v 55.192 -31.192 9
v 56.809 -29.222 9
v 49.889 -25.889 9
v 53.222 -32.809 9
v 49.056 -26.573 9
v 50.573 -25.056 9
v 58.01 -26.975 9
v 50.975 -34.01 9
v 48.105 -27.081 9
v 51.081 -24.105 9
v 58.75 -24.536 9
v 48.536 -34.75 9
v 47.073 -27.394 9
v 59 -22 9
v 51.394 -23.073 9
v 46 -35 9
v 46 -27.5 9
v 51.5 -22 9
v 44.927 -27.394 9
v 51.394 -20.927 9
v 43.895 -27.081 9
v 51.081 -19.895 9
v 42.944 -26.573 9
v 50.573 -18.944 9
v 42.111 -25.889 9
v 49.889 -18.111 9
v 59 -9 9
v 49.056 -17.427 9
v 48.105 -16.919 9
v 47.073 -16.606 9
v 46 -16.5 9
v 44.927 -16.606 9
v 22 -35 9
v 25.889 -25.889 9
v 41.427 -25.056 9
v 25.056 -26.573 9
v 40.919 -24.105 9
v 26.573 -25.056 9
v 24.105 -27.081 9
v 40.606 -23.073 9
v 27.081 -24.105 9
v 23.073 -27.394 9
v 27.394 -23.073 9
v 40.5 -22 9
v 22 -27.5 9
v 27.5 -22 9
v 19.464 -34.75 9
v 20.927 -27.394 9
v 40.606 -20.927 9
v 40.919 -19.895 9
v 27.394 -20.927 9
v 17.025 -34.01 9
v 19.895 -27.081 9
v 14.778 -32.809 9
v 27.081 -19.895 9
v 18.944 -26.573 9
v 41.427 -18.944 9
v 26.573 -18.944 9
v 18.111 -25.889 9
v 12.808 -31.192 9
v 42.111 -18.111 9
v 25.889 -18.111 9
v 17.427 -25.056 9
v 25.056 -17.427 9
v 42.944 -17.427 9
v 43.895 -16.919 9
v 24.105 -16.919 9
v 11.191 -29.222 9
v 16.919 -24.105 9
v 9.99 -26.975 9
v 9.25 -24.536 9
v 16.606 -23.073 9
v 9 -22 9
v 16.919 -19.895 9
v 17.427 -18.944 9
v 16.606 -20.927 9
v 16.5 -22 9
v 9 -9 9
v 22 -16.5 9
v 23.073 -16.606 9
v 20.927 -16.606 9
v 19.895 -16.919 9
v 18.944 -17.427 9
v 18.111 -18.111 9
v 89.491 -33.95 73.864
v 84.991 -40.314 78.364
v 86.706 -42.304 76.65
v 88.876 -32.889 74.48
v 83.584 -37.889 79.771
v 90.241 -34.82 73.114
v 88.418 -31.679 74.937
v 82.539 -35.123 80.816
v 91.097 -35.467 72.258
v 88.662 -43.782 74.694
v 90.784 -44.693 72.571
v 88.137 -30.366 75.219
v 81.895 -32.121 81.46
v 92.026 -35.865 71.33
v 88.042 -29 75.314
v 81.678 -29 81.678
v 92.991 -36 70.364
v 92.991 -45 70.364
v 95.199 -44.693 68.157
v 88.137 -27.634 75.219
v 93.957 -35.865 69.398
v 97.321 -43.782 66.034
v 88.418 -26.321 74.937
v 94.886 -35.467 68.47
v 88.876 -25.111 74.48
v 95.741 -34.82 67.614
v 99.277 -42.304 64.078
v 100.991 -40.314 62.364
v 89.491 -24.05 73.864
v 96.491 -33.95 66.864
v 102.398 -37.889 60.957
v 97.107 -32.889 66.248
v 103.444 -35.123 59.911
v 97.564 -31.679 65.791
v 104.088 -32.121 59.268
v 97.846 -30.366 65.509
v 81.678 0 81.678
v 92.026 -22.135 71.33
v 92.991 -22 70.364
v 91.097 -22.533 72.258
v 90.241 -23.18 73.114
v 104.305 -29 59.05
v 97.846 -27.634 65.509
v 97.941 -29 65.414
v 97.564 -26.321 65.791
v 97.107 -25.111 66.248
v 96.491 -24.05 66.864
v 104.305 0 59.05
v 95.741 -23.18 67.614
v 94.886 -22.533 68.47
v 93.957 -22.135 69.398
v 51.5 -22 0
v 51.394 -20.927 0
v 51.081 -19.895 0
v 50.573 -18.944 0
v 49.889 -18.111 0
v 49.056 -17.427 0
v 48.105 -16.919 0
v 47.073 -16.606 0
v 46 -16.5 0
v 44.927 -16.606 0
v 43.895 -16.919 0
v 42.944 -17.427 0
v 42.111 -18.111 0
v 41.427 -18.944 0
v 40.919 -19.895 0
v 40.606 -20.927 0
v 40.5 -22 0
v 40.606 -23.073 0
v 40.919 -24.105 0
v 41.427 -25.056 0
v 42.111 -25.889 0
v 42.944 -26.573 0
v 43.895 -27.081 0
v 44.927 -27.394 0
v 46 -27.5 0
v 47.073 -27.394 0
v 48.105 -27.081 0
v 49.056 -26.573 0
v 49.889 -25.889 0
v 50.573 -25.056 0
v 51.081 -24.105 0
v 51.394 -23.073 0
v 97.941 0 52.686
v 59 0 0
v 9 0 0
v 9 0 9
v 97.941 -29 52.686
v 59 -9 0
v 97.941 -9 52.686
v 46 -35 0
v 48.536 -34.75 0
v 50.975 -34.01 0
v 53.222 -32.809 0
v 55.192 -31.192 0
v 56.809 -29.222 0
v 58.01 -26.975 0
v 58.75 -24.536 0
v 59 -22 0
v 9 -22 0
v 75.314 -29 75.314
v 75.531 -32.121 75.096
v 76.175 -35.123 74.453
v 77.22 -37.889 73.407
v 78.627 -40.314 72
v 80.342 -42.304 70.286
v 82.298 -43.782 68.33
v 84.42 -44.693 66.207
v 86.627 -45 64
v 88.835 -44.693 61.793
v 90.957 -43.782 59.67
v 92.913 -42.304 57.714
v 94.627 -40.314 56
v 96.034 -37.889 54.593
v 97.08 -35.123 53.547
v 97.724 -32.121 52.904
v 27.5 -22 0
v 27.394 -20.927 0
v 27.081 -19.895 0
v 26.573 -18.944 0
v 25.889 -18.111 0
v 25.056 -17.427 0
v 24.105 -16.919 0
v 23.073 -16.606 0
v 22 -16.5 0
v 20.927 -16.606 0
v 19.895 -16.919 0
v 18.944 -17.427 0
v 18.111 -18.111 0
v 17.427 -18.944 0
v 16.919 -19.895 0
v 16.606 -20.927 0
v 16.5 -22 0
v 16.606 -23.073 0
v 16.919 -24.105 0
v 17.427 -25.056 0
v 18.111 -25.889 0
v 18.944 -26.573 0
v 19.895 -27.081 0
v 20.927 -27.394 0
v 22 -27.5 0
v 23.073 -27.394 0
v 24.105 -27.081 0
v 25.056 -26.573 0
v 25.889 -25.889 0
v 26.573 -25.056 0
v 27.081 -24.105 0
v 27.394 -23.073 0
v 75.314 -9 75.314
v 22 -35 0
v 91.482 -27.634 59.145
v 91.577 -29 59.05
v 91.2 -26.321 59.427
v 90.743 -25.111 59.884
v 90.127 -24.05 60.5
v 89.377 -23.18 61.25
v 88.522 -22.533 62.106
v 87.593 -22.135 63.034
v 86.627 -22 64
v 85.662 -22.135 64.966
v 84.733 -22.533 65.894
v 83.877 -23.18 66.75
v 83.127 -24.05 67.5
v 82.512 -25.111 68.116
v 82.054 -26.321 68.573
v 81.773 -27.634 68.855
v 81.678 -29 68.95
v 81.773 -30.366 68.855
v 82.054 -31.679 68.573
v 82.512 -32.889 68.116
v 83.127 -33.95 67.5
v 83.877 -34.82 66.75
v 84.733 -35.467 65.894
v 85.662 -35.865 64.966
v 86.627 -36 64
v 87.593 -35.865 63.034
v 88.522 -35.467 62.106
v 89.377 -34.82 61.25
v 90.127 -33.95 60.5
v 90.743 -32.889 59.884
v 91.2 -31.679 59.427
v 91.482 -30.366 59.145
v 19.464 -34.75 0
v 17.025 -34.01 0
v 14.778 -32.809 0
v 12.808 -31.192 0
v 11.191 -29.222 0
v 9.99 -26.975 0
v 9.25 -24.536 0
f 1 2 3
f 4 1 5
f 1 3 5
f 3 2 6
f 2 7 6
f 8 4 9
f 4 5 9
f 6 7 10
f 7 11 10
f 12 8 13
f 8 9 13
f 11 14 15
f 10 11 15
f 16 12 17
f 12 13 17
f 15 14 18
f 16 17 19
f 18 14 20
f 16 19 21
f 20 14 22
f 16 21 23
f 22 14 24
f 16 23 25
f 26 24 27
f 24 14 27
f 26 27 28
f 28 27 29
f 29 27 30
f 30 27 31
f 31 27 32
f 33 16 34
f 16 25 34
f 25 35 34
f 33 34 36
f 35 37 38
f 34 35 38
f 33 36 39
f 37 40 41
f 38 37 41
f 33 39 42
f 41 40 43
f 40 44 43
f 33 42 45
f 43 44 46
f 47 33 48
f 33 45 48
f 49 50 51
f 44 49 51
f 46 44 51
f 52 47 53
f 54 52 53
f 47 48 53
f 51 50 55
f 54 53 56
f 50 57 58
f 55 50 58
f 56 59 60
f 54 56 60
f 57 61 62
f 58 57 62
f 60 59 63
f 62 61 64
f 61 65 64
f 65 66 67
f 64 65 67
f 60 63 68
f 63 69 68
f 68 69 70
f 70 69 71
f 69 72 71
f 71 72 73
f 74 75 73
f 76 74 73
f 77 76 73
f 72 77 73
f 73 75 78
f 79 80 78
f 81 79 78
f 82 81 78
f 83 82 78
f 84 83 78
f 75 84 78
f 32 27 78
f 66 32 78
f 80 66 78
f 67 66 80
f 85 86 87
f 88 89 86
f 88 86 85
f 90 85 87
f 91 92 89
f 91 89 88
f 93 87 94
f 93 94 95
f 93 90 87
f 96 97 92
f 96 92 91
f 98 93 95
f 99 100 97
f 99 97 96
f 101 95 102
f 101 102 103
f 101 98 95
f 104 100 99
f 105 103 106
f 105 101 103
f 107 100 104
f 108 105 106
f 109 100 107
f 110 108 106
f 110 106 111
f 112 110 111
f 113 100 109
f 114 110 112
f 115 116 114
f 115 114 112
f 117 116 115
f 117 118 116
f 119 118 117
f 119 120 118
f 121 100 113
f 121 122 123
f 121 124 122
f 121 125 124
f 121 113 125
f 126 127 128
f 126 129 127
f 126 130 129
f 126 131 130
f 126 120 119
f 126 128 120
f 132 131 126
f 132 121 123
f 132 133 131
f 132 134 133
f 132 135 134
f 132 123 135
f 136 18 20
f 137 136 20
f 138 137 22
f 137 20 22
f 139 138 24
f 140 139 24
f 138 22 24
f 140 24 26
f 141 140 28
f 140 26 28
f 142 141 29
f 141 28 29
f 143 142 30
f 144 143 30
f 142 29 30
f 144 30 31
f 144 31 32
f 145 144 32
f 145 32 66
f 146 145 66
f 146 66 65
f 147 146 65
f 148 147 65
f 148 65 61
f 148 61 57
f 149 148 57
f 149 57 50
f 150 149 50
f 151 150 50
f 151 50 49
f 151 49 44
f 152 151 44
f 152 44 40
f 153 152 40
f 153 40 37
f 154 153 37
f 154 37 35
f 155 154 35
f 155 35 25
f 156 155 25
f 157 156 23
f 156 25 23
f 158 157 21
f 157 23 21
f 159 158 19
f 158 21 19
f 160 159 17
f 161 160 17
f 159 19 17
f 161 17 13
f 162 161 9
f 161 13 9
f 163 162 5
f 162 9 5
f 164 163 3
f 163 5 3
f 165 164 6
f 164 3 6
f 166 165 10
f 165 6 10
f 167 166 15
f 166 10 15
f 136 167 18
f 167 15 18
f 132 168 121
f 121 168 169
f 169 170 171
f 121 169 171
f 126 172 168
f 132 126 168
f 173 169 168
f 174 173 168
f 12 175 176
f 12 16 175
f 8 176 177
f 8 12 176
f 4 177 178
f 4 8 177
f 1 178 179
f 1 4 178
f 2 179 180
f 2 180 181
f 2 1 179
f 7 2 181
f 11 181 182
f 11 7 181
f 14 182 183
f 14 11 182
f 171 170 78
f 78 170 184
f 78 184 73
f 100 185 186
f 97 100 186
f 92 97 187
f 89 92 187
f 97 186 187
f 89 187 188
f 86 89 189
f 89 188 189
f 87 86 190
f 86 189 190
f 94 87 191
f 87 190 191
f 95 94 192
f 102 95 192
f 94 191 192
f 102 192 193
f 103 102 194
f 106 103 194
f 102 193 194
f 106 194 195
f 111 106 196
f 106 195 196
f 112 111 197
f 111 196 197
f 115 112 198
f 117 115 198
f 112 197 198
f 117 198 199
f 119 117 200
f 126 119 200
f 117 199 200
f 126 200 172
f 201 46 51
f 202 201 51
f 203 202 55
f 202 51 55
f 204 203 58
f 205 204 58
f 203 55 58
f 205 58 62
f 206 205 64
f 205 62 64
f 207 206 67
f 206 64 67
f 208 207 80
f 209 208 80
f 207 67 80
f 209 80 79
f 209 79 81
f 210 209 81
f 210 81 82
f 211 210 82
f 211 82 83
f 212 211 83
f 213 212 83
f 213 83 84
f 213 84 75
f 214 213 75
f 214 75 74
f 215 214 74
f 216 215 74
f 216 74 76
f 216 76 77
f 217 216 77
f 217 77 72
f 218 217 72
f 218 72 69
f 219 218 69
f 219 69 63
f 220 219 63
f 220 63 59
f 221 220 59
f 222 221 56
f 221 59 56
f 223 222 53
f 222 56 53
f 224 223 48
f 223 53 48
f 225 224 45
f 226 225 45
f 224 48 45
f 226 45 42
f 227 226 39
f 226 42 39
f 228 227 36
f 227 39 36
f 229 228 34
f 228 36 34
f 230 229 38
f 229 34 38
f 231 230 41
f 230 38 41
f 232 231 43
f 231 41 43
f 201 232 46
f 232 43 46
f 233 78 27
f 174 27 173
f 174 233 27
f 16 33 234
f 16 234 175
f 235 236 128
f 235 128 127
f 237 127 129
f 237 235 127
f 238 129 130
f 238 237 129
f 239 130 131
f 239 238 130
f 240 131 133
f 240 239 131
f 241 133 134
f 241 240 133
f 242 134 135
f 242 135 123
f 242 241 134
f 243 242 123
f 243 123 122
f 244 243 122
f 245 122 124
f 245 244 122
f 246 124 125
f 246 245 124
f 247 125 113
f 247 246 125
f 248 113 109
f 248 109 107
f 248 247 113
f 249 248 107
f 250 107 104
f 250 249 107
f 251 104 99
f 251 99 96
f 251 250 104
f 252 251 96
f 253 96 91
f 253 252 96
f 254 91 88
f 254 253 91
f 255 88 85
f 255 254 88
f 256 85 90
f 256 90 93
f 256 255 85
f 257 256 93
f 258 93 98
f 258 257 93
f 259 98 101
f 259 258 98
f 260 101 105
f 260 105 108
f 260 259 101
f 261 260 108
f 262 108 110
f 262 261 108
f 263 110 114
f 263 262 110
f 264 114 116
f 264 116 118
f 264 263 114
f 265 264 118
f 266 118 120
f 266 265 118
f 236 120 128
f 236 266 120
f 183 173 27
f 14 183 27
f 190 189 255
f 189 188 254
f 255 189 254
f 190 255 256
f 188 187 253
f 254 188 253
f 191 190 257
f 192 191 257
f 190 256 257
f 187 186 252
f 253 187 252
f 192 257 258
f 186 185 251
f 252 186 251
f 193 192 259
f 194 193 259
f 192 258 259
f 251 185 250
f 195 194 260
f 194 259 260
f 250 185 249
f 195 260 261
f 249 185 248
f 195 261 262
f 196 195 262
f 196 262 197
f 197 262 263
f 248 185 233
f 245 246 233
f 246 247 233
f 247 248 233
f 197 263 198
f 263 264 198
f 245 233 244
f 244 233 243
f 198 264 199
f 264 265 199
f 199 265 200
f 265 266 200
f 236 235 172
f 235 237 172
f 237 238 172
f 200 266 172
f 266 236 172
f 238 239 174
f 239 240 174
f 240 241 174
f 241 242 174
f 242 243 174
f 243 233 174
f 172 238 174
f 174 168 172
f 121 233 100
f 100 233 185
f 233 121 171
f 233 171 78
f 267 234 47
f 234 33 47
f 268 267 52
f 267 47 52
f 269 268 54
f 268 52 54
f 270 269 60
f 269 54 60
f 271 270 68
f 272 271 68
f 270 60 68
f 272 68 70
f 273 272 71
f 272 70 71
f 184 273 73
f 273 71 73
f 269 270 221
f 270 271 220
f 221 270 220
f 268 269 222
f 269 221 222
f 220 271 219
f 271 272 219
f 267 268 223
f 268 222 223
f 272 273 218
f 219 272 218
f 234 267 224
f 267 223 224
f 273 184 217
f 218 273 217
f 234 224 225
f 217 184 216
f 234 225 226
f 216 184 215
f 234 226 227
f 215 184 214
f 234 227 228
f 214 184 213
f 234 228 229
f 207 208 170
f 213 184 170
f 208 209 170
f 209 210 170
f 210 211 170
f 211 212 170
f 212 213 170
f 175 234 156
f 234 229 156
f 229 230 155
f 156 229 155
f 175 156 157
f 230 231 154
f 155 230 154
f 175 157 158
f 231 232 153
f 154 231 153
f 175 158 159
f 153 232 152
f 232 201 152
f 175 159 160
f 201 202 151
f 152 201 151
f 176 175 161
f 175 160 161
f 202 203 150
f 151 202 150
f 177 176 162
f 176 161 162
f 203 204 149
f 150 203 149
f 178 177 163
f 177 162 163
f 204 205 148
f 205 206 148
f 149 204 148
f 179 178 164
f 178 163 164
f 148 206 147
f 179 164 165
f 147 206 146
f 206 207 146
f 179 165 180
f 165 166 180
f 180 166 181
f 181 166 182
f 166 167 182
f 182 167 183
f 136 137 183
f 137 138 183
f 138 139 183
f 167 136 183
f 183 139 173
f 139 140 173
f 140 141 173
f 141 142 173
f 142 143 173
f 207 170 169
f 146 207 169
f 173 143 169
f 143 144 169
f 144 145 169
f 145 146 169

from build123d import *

# Parameters (mm, degrees)
F1_DEPTH  = 9
F3_DEPTH  = 26
F5_DEPTH  = 35.001
F6_R      = 7
F7_DEPTH  = 9
F8_R      = 13
F9_R      = 5.5
F10_DEPTH = 9.001


with BuildPart() as f1:
    # F0 (on Front) → F1 (new body)
    with BuildSketch(Plane.XZ):
        Polygon((75.313708, 75.313708), (0, 0), (59, 0), (97.941125, 52.686292), align=None)
    extrude(amount=F1_DEPTH)

    # F2 (on face) → F3 (join)
    with BuildSketch(Plane.XZ.offset(9)):
        Polygon((0, 0), (59, 0), (59, 9), (9, 9), align=None)
    extrude(amount=F3_DEPTH)

    # F4 (on face) → F5 (cut, through all)
    with BuildSketch(Plane.XZ.offset(35)):
        Polygon((9, 9), (0, 0), (9, 0), align=None)
    extrude(amount=-F5_DEPTH, mode=Mode.SUBTRACT)

    # F6 (on face) → F7 (join)
    with BuildSketch(Plane(origin=(75.313708, 0, 75.313708), x_dir=(0.707107, 0, -0.707107), z_dir=(0.707107, 0, 0.707107))):
        with BuildLine():
            Line((32, 0), (0, 0))
            Line((0, 0), (0, -29))
            ThreePointArc((0, -29), (16, -45), (32, -29))
            Line((32, -29), (32, 0))
        make_face()
        with Locations((16, -29)):
            Circle(F6_R, mode=Mode.SUBTRACT)
    extrude(amount=F7_DEPTH)

    # F8
    f8_edges = [f1.edges().sort_by_distance(p)[0] for p in [
        (9, -35, 4.5),
        (59, -35, 4.5),
    ]]
    fillet(f8_edges, radius=F8_R)

    # F9 (on face) → F10 (cut, through all)
    with BuildSketch(Plane.XY.offset(9)):
        with Locations((22, -22)):
            Circle(F9_R)
        with Locations((46, -22)):
            Circle(F9_R)
    extrude(amount=-F10_DEPTH, mode=Mode.SUBTRACT)


solid = f1.part
